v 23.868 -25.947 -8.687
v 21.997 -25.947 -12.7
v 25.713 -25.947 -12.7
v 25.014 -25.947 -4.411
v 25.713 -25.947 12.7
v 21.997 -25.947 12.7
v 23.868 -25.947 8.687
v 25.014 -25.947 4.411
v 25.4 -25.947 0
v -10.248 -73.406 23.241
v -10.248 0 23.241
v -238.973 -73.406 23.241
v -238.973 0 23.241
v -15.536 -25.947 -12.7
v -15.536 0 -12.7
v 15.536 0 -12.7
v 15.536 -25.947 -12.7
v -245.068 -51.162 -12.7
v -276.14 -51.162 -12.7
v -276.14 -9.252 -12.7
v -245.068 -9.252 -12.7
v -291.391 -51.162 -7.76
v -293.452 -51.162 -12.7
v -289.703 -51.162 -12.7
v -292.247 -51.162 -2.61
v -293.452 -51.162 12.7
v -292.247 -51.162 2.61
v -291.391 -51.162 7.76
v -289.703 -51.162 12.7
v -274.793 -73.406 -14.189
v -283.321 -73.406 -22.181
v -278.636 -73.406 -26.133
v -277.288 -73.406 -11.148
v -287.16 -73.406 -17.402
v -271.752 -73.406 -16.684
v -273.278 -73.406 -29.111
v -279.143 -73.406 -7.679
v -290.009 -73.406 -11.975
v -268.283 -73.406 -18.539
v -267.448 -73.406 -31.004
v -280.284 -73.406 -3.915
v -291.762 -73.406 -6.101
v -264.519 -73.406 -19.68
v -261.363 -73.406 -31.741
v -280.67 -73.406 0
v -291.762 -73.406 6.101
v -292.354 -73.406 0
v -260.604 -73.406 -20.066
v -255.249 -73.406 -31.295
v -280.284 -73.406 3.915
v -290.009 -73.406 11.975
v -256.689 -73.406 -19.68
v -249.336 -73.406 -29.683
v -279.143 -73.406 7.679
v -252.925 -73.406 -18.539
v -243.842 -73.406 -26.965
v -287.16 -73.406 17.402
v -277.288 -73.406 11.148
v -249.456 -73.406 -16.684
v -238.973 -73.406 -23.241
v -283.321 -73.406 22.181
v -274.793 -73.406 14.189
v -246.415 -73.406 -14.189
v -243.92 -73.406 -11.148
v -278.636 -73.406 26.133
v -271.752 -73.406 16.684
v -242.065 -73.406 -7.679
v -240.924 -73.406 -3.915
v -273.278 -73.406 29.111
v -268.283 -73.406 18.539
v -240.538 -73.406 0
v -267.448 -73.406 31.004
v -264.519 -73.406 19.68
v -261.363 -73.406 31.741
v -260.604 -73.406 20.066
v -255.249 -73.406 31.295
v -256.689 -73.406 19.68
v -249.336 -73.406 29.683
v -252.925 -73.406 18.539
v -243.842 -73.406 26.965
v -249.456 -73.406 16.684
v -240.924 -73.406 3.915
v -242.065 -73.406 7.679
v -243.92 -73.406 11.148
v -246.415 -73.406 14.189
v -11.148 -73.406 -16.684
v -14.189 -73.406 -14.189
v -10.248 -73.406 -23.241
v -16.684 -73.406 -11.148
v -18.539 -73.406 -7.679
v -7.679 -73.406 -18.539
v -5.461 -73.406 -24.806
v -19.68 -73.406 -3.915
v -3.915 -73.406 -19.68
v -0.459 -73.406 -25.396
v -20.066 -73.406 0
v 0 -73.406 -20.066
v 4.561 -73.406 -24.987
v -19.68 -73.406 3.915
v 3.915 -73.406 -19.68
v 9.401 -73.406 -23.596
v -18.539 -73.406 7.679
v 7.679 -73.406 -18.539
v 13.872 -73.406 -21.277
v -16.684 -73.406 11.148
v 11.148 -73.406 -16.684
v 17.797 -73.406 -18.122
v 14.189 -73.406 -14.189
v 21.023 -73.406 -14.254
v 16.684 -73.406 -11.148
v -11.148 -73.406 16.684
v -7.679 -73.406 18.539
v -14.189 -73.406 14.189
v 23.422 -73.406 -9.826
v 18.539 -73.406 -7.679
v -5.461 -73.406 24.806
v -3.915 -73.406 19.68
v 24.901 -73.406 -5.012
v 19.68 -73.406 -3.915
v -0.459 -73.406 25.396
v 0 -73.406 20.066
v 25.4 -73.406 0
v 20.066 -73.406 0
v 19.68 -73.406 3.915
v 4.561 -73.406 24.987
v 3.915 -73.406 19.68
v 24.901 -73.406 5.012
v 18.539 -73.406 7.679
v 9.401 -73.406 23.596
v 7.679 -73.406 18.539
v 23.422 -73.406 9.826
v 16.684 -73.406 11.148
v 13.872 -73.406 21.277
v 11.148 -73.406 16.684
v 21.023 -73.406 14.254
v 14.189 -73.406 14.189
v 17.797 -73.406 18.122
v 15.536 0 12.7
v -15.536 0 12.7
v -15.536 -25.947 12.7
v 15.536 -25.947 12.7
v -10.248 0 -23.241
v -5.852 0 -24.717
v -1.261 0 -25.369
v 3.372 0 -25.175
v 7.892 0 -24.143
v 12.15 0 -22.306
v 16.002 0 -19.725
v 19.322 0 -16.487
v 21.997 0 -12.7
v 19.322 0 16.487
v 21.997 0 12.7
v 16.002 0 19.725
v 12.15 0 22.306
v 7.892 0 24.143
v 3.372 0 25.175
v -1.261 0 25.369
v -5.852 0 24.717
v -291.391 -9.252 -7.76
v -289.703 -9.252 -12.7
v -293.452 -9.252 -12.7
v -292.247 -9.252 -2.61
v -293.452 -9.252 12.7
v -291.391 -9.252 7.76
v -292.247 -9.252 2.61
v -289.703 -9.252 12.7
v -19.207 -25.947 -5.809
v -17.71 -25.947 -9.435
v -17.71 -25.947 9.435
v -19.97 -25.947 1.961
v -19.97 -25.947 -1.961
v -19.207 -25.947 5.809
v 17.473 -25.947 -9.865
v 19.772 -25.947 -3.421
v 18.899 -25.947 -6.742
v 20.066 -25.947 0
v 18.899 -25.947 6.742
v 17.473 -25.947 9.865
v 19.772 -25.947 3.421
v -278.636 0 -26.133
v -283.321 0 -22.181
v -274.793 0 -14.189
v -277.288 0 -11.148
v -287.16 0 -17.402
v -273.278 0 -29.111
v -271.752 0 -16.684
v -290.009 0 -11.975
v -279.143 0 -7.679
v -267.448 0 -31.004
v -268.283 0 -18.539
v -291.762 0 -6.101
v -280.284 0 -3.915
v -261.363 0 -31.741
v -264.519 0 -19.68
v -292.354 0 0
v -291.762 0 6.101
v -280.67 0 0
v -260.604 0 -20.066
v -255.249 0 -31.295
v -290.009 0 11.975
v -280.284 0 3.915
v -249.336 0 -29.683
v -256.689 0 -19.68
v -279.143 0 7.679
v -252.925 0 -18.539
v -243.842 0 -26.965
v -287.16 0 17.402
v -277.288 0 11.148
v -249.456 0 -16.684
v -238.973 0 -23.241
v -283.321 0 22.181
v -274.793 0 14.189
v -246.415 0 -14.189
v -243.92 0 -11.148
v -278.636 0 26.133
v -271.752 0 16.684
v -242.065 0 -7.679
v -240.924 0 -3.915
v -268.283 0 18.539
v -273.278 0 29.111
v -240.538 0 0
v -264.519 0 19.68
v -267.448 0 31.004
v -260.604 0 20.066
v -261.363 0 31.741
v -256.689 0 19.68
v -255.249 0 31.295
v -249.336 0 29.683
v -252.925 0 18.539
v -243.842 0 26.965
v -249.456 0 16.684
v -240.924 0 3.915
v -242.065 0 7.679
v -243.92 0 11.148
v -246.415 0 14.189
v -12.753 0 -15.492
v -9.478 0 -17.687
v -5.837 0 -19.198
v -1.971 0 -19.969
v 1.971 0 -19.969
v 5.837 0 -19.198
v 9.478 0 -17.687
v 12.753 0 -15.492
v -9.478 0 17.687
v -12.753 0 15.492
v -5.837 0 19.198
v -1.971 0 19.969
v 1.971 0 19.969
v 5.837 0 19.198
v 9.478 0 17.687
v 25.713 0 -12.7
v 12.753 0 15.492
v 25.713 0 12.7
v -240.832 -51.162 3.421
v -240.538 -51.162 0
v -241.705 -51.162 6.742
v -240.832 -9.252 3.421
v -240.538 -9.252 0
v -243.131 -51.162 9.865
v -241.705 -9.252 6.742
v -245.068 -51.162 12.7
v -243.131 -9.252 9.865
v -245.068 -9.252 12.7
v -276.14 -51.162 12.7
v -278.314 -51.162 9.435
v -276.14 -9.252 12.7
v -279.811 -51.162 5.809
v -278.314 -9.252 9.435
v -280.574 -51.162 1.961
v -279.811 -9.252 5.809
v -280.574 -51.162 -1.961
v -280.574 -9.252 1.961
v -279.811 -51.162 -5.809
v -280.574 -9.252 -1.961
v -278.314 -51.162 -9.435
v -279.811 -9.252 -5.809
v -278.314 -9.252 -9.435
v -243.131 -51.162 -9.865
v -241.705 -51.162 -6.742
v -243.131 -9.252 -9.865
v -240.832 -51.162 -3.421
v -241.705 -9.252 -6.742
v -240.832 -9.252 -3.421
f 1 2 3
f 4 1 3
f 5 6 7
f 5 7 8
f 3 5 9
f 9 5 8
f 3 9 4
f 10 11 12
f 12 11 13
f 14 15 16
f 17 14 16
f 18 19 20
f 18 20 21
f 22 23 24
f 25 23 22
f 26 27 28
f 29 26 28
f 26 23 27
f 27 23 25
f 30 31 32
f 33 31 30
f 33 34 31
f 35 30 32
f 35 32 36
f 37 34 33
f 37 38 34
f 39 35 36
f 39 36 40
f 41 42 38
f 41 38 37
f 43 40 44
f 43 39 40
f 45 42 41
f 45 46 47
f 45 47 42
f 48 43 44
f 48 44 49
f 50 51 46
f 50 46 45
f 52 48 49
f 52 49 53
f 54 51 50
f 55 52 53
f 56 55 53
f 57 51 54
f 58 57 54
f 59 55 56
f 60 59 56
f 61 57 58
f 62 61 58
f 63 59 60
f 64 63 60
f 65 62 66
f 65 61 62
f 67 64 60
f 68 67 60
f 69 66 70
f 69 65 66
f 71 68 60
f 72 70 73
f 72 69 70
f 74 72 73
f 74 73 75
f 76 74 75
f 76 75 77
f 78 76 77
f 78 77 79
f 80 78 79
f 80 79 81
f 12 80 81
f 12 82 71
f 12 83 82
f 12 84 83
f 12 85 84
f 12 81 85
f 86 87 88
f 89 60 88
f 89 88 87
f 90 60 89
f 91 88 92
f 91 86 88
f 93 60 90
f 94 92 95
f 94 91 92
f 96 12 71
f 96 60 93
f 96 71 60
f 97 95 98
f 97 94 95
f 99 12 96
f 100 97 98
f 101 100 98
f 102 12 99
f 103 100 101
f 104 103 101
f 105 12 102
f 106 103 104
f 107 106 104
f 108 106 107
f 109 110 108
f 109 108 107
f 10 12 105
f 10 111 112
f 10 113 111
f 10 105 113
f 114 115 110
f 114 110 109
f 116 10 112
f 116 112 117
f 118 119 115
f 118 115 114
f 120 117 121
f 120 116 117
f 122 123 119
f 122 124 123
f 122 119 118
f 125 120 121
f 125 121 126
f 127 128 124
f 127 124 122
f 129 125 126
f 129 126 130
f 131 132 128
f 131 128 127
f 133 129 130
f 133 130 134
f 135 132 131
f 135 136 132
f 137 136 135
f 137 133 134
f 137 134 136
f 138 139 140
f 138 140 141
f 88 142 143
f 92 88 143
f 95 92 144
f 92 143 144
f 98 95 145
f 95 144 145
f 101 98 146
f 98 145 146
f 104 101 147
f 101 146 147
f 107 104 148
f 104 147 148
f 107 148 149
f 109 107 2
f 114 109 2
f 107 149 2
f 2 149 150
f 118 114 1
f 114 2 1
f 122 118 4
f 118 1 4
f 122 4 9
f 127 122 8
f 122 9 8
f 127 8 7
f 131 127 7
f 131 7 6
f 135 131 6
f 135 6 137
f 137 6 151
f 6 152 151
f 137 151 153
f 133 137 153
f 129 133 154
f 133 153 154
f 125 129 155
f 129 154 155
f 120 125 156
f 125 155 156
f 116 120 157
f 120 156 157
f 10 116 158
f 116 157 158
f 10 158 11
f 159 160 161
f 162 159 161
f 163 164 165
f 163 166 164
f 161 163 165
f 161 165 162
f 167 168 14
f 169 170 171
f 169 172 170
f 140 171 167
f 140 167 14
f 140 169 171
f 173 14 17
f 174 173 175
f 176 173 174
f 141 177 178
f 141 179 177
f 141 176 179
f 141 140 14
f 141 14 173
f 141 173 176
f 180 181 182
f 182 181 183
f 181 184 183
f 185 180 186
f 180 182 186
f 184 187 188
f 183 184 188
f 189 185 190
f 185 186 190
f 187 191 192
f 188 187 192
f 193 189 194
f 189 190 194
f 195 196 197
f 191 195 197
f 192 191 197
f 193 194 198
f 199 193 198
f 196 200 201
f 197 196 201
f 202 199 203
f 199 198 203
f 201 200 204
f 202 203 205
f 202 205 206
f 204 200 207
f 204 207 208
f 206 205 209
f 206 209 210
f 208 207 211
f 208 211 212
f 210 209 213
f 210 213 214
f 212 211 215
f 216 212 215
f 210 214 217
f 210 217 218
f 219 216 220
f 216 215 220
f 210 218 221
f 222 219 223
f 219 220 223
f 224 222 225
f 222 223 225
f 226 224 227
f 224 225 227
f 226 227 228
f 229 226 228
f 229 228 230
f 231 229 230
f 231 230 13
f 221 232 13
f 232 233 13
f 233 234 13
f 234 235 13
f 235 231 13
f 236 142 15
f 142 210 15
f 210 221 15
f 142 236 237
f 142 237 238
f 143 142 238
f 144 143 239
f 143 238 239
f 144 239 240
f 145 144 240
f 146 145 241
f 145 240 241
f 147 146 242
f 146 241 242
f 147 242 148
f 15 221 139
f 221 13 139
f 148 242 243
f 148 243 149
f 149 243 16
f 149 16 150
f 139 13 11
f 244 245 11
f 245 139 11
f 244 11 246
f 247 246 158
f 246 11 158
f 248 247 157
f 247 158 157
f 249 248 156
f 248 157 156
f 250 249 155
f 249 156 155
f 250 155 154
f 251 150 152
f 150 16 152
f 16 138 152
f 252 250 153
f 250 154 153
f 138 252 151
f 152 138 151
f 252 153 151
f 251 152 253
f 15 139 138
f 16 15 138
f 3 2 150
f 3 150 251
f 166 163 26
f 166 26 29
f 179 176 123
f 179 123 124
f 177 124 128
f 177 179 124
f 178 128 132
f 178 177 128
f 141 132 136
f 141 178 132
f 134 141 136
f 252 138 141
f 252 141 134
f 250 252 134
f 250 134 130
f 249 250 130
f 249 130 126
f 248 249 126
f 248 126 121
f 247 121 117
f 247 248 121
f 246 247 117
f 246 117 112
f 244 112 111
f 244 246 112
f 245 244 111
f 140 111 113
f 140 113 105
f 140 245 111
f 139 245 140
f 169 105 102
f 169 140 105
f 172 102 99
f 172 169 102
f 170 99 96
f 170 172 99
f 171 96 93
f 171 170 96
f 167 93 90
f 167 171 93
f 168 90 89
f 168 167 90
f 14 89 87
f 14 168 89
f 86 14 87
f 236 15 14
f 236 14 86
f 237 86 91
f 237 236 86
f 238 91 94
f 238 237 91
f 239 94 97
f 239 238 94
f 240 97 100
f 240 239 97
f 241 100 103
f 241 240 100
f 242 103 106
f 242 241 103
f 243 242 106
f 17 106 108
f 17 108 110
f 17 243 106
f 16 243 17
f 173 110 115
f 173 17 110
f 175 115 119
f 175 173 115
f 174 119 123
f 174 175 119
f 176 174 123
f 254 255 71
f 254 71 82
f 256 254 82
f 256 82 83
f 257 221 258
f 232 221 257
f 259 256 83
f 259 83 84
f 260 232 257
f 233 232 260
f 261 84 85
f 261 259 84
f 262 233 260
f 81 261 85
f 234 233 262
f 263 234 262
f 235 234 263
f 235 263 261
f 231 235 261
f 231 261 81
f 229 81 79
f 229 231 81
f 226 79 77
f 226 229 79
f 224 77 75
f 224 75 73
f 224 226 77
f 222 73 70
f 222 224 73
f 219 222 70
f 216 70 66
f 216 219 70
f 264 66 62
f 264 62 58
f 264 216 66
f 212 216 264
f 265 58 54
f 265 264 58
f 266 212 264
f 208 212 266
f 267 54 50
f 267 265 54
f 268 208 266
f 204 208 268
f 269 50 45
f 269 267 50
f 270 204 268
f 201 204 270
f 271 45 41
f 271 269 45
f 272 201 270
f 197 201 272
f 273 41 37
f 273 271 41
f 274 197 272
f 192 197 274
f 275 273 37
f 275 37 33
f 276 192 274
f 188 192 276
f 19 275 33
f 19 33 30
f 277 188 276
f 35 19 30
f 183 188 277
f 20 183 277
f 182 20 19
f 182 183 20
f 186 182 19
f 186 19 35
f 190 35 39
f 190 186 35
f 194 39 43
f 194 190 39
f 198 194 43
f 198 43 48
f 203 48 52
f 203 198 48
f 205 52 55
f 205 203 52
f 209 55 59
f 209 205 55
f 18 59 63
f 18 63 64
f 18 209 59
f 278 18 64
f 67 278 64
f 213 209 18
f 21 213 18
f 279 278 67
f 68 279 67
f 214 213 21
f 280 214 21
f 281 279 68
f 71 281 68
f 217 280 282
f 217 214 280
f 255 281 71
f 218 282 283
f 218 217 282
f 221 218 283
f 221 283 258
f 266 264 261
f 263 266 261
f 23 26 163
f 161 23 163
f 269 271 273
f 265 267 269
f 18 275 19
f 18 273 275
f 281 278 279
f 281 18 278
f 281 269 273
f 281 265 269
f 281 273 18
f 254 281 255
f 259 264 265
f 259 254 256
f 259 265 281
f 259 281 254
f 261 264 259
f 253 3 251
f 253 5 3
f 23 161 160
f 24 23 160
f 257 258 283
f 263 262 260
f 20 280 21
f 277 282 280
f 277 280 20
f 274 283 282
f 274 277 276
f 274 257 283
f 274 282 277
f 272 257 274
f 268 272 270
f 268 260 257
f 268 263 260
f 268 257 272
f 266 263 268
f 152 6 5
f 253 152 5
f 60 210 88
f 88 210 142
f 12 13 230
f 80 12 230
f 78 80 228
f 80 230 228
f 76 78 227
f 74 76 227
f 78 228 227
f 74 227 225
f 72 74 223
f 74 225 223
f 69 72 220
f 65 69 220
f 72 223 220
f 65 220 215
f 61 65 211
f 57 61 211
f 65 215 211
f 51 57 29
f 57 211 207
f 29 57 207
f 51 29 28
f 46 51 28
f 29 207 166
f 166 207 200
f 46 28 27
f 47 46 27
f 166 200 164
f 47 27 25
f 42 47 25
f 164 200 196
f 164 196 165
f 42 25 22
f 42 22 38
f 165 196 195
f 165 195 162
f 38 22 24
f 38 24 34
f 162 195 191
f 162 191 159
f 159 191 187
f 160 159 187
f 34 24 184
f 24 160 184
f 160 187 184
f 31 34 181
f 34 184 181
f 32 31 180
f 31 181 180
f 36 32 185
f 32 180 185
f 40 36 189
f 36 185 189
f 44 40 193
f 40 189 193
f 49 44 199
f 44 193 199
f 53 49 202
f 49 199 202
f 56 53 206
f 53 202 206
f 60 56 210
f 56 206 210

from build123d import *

# Parameters (mm, degrees)
F0_R     = 20.066
F1_DEPTH = 25.4
F2_DEPTH = 48.006
F3_W     = 1.0977562389
F3_H     = 41.91
F4_DEPTH = 12.7


with BuildPart() as f1:
    # F0 (on Front) → F1 (new body)
    with BuildSketch(Plane.XZ):
        with BuildLine():
            ThreePointArc((-10.2477275042, -23.241), (-25.4, 0), (-10.2477275042, 23.241))
            Line((-10.2477275042, 23.241), (-238.9725779709, 23.241))
            ThreePointArc((-238.9725779709, 23.241), (-231.493347745, 12.674084791), (-228.854, 0))
            ThreePointArc((-228.854, 0), (-231.493347745, -12.674084791), (-238.9725779709, -23.241))
            Line((-238.9725779709, -23.241), (-10.2477275042, -23.241))
        make_face()
        with BuildLine():
            ThreePointArc((-228.854, 0), (-231.493347745, 12.674084791), (-238.9725779709, 23.241))
            ThreePointArc((-238.9725779709, 23.241), (-292.354, 0), (-238.9725779709, -23.241))
            ThreePointArc((-238.9725779709, -23.241), (-231.493347745, -12.674084791), (-228.854, 0))
        make_face()
        with Locations((-260.604, 0)):
            Circle(F0_R, mode=Mode.SUBTRACT)
        with BuildLine():
            ThreePointArc((-10.2477275042, -23.241), (13.8720532257, -21.2773621322), (25.4, 0))
            ThreePointArc((25.4, 0), (13.8720532257, 21.2773621322), (-10.2477275042, 23.241))
            ThreePointArc((-10.2477275042, 23.241), (-25.4, 0), (-10.2477275042, -23.241))
        make_face()
        Circle(F0_R, mode=Mode.SUBTRACT)
    extrude(amount=F1_DEPTH)

    # F2 (add): a face of the model
    f2_faces = [f1.faces().sort_by_distance(p)[0] for p in [
        (-139.2710743105, -25.4, 0),
    ]]
    extrude(f2_faces, amount=F2_DEPTH)

    # F3 (on Top) → F4 (join, symmetric)
    with BuildSketch(Plane.XY):
        Polygon((-10.2477275042, 0), (-163.8780487135, 0), (-188.47713992, -9.2518740857), (-292.354, -9.2518740857), (-292.354, -51.1618740857), (-180.8564199804, -51.1618740857), (-113.8137692817, -25.9467083128), (-10.2477275042, -25.9467083128), align=None)
        Polygon((25.4, 0), (-10.2477275042, 0), (-10.2477275042, -25.9467083128), (25.713481009, -25.9467083128), (25.713481009, 0), align=None)
        with Locations((-292.9028781195, -30.2068740857)):
            Rectangle(F3_W, F3_H)
    extrude(amount=F4_DEPTH, both=True)


solid = f1.part
